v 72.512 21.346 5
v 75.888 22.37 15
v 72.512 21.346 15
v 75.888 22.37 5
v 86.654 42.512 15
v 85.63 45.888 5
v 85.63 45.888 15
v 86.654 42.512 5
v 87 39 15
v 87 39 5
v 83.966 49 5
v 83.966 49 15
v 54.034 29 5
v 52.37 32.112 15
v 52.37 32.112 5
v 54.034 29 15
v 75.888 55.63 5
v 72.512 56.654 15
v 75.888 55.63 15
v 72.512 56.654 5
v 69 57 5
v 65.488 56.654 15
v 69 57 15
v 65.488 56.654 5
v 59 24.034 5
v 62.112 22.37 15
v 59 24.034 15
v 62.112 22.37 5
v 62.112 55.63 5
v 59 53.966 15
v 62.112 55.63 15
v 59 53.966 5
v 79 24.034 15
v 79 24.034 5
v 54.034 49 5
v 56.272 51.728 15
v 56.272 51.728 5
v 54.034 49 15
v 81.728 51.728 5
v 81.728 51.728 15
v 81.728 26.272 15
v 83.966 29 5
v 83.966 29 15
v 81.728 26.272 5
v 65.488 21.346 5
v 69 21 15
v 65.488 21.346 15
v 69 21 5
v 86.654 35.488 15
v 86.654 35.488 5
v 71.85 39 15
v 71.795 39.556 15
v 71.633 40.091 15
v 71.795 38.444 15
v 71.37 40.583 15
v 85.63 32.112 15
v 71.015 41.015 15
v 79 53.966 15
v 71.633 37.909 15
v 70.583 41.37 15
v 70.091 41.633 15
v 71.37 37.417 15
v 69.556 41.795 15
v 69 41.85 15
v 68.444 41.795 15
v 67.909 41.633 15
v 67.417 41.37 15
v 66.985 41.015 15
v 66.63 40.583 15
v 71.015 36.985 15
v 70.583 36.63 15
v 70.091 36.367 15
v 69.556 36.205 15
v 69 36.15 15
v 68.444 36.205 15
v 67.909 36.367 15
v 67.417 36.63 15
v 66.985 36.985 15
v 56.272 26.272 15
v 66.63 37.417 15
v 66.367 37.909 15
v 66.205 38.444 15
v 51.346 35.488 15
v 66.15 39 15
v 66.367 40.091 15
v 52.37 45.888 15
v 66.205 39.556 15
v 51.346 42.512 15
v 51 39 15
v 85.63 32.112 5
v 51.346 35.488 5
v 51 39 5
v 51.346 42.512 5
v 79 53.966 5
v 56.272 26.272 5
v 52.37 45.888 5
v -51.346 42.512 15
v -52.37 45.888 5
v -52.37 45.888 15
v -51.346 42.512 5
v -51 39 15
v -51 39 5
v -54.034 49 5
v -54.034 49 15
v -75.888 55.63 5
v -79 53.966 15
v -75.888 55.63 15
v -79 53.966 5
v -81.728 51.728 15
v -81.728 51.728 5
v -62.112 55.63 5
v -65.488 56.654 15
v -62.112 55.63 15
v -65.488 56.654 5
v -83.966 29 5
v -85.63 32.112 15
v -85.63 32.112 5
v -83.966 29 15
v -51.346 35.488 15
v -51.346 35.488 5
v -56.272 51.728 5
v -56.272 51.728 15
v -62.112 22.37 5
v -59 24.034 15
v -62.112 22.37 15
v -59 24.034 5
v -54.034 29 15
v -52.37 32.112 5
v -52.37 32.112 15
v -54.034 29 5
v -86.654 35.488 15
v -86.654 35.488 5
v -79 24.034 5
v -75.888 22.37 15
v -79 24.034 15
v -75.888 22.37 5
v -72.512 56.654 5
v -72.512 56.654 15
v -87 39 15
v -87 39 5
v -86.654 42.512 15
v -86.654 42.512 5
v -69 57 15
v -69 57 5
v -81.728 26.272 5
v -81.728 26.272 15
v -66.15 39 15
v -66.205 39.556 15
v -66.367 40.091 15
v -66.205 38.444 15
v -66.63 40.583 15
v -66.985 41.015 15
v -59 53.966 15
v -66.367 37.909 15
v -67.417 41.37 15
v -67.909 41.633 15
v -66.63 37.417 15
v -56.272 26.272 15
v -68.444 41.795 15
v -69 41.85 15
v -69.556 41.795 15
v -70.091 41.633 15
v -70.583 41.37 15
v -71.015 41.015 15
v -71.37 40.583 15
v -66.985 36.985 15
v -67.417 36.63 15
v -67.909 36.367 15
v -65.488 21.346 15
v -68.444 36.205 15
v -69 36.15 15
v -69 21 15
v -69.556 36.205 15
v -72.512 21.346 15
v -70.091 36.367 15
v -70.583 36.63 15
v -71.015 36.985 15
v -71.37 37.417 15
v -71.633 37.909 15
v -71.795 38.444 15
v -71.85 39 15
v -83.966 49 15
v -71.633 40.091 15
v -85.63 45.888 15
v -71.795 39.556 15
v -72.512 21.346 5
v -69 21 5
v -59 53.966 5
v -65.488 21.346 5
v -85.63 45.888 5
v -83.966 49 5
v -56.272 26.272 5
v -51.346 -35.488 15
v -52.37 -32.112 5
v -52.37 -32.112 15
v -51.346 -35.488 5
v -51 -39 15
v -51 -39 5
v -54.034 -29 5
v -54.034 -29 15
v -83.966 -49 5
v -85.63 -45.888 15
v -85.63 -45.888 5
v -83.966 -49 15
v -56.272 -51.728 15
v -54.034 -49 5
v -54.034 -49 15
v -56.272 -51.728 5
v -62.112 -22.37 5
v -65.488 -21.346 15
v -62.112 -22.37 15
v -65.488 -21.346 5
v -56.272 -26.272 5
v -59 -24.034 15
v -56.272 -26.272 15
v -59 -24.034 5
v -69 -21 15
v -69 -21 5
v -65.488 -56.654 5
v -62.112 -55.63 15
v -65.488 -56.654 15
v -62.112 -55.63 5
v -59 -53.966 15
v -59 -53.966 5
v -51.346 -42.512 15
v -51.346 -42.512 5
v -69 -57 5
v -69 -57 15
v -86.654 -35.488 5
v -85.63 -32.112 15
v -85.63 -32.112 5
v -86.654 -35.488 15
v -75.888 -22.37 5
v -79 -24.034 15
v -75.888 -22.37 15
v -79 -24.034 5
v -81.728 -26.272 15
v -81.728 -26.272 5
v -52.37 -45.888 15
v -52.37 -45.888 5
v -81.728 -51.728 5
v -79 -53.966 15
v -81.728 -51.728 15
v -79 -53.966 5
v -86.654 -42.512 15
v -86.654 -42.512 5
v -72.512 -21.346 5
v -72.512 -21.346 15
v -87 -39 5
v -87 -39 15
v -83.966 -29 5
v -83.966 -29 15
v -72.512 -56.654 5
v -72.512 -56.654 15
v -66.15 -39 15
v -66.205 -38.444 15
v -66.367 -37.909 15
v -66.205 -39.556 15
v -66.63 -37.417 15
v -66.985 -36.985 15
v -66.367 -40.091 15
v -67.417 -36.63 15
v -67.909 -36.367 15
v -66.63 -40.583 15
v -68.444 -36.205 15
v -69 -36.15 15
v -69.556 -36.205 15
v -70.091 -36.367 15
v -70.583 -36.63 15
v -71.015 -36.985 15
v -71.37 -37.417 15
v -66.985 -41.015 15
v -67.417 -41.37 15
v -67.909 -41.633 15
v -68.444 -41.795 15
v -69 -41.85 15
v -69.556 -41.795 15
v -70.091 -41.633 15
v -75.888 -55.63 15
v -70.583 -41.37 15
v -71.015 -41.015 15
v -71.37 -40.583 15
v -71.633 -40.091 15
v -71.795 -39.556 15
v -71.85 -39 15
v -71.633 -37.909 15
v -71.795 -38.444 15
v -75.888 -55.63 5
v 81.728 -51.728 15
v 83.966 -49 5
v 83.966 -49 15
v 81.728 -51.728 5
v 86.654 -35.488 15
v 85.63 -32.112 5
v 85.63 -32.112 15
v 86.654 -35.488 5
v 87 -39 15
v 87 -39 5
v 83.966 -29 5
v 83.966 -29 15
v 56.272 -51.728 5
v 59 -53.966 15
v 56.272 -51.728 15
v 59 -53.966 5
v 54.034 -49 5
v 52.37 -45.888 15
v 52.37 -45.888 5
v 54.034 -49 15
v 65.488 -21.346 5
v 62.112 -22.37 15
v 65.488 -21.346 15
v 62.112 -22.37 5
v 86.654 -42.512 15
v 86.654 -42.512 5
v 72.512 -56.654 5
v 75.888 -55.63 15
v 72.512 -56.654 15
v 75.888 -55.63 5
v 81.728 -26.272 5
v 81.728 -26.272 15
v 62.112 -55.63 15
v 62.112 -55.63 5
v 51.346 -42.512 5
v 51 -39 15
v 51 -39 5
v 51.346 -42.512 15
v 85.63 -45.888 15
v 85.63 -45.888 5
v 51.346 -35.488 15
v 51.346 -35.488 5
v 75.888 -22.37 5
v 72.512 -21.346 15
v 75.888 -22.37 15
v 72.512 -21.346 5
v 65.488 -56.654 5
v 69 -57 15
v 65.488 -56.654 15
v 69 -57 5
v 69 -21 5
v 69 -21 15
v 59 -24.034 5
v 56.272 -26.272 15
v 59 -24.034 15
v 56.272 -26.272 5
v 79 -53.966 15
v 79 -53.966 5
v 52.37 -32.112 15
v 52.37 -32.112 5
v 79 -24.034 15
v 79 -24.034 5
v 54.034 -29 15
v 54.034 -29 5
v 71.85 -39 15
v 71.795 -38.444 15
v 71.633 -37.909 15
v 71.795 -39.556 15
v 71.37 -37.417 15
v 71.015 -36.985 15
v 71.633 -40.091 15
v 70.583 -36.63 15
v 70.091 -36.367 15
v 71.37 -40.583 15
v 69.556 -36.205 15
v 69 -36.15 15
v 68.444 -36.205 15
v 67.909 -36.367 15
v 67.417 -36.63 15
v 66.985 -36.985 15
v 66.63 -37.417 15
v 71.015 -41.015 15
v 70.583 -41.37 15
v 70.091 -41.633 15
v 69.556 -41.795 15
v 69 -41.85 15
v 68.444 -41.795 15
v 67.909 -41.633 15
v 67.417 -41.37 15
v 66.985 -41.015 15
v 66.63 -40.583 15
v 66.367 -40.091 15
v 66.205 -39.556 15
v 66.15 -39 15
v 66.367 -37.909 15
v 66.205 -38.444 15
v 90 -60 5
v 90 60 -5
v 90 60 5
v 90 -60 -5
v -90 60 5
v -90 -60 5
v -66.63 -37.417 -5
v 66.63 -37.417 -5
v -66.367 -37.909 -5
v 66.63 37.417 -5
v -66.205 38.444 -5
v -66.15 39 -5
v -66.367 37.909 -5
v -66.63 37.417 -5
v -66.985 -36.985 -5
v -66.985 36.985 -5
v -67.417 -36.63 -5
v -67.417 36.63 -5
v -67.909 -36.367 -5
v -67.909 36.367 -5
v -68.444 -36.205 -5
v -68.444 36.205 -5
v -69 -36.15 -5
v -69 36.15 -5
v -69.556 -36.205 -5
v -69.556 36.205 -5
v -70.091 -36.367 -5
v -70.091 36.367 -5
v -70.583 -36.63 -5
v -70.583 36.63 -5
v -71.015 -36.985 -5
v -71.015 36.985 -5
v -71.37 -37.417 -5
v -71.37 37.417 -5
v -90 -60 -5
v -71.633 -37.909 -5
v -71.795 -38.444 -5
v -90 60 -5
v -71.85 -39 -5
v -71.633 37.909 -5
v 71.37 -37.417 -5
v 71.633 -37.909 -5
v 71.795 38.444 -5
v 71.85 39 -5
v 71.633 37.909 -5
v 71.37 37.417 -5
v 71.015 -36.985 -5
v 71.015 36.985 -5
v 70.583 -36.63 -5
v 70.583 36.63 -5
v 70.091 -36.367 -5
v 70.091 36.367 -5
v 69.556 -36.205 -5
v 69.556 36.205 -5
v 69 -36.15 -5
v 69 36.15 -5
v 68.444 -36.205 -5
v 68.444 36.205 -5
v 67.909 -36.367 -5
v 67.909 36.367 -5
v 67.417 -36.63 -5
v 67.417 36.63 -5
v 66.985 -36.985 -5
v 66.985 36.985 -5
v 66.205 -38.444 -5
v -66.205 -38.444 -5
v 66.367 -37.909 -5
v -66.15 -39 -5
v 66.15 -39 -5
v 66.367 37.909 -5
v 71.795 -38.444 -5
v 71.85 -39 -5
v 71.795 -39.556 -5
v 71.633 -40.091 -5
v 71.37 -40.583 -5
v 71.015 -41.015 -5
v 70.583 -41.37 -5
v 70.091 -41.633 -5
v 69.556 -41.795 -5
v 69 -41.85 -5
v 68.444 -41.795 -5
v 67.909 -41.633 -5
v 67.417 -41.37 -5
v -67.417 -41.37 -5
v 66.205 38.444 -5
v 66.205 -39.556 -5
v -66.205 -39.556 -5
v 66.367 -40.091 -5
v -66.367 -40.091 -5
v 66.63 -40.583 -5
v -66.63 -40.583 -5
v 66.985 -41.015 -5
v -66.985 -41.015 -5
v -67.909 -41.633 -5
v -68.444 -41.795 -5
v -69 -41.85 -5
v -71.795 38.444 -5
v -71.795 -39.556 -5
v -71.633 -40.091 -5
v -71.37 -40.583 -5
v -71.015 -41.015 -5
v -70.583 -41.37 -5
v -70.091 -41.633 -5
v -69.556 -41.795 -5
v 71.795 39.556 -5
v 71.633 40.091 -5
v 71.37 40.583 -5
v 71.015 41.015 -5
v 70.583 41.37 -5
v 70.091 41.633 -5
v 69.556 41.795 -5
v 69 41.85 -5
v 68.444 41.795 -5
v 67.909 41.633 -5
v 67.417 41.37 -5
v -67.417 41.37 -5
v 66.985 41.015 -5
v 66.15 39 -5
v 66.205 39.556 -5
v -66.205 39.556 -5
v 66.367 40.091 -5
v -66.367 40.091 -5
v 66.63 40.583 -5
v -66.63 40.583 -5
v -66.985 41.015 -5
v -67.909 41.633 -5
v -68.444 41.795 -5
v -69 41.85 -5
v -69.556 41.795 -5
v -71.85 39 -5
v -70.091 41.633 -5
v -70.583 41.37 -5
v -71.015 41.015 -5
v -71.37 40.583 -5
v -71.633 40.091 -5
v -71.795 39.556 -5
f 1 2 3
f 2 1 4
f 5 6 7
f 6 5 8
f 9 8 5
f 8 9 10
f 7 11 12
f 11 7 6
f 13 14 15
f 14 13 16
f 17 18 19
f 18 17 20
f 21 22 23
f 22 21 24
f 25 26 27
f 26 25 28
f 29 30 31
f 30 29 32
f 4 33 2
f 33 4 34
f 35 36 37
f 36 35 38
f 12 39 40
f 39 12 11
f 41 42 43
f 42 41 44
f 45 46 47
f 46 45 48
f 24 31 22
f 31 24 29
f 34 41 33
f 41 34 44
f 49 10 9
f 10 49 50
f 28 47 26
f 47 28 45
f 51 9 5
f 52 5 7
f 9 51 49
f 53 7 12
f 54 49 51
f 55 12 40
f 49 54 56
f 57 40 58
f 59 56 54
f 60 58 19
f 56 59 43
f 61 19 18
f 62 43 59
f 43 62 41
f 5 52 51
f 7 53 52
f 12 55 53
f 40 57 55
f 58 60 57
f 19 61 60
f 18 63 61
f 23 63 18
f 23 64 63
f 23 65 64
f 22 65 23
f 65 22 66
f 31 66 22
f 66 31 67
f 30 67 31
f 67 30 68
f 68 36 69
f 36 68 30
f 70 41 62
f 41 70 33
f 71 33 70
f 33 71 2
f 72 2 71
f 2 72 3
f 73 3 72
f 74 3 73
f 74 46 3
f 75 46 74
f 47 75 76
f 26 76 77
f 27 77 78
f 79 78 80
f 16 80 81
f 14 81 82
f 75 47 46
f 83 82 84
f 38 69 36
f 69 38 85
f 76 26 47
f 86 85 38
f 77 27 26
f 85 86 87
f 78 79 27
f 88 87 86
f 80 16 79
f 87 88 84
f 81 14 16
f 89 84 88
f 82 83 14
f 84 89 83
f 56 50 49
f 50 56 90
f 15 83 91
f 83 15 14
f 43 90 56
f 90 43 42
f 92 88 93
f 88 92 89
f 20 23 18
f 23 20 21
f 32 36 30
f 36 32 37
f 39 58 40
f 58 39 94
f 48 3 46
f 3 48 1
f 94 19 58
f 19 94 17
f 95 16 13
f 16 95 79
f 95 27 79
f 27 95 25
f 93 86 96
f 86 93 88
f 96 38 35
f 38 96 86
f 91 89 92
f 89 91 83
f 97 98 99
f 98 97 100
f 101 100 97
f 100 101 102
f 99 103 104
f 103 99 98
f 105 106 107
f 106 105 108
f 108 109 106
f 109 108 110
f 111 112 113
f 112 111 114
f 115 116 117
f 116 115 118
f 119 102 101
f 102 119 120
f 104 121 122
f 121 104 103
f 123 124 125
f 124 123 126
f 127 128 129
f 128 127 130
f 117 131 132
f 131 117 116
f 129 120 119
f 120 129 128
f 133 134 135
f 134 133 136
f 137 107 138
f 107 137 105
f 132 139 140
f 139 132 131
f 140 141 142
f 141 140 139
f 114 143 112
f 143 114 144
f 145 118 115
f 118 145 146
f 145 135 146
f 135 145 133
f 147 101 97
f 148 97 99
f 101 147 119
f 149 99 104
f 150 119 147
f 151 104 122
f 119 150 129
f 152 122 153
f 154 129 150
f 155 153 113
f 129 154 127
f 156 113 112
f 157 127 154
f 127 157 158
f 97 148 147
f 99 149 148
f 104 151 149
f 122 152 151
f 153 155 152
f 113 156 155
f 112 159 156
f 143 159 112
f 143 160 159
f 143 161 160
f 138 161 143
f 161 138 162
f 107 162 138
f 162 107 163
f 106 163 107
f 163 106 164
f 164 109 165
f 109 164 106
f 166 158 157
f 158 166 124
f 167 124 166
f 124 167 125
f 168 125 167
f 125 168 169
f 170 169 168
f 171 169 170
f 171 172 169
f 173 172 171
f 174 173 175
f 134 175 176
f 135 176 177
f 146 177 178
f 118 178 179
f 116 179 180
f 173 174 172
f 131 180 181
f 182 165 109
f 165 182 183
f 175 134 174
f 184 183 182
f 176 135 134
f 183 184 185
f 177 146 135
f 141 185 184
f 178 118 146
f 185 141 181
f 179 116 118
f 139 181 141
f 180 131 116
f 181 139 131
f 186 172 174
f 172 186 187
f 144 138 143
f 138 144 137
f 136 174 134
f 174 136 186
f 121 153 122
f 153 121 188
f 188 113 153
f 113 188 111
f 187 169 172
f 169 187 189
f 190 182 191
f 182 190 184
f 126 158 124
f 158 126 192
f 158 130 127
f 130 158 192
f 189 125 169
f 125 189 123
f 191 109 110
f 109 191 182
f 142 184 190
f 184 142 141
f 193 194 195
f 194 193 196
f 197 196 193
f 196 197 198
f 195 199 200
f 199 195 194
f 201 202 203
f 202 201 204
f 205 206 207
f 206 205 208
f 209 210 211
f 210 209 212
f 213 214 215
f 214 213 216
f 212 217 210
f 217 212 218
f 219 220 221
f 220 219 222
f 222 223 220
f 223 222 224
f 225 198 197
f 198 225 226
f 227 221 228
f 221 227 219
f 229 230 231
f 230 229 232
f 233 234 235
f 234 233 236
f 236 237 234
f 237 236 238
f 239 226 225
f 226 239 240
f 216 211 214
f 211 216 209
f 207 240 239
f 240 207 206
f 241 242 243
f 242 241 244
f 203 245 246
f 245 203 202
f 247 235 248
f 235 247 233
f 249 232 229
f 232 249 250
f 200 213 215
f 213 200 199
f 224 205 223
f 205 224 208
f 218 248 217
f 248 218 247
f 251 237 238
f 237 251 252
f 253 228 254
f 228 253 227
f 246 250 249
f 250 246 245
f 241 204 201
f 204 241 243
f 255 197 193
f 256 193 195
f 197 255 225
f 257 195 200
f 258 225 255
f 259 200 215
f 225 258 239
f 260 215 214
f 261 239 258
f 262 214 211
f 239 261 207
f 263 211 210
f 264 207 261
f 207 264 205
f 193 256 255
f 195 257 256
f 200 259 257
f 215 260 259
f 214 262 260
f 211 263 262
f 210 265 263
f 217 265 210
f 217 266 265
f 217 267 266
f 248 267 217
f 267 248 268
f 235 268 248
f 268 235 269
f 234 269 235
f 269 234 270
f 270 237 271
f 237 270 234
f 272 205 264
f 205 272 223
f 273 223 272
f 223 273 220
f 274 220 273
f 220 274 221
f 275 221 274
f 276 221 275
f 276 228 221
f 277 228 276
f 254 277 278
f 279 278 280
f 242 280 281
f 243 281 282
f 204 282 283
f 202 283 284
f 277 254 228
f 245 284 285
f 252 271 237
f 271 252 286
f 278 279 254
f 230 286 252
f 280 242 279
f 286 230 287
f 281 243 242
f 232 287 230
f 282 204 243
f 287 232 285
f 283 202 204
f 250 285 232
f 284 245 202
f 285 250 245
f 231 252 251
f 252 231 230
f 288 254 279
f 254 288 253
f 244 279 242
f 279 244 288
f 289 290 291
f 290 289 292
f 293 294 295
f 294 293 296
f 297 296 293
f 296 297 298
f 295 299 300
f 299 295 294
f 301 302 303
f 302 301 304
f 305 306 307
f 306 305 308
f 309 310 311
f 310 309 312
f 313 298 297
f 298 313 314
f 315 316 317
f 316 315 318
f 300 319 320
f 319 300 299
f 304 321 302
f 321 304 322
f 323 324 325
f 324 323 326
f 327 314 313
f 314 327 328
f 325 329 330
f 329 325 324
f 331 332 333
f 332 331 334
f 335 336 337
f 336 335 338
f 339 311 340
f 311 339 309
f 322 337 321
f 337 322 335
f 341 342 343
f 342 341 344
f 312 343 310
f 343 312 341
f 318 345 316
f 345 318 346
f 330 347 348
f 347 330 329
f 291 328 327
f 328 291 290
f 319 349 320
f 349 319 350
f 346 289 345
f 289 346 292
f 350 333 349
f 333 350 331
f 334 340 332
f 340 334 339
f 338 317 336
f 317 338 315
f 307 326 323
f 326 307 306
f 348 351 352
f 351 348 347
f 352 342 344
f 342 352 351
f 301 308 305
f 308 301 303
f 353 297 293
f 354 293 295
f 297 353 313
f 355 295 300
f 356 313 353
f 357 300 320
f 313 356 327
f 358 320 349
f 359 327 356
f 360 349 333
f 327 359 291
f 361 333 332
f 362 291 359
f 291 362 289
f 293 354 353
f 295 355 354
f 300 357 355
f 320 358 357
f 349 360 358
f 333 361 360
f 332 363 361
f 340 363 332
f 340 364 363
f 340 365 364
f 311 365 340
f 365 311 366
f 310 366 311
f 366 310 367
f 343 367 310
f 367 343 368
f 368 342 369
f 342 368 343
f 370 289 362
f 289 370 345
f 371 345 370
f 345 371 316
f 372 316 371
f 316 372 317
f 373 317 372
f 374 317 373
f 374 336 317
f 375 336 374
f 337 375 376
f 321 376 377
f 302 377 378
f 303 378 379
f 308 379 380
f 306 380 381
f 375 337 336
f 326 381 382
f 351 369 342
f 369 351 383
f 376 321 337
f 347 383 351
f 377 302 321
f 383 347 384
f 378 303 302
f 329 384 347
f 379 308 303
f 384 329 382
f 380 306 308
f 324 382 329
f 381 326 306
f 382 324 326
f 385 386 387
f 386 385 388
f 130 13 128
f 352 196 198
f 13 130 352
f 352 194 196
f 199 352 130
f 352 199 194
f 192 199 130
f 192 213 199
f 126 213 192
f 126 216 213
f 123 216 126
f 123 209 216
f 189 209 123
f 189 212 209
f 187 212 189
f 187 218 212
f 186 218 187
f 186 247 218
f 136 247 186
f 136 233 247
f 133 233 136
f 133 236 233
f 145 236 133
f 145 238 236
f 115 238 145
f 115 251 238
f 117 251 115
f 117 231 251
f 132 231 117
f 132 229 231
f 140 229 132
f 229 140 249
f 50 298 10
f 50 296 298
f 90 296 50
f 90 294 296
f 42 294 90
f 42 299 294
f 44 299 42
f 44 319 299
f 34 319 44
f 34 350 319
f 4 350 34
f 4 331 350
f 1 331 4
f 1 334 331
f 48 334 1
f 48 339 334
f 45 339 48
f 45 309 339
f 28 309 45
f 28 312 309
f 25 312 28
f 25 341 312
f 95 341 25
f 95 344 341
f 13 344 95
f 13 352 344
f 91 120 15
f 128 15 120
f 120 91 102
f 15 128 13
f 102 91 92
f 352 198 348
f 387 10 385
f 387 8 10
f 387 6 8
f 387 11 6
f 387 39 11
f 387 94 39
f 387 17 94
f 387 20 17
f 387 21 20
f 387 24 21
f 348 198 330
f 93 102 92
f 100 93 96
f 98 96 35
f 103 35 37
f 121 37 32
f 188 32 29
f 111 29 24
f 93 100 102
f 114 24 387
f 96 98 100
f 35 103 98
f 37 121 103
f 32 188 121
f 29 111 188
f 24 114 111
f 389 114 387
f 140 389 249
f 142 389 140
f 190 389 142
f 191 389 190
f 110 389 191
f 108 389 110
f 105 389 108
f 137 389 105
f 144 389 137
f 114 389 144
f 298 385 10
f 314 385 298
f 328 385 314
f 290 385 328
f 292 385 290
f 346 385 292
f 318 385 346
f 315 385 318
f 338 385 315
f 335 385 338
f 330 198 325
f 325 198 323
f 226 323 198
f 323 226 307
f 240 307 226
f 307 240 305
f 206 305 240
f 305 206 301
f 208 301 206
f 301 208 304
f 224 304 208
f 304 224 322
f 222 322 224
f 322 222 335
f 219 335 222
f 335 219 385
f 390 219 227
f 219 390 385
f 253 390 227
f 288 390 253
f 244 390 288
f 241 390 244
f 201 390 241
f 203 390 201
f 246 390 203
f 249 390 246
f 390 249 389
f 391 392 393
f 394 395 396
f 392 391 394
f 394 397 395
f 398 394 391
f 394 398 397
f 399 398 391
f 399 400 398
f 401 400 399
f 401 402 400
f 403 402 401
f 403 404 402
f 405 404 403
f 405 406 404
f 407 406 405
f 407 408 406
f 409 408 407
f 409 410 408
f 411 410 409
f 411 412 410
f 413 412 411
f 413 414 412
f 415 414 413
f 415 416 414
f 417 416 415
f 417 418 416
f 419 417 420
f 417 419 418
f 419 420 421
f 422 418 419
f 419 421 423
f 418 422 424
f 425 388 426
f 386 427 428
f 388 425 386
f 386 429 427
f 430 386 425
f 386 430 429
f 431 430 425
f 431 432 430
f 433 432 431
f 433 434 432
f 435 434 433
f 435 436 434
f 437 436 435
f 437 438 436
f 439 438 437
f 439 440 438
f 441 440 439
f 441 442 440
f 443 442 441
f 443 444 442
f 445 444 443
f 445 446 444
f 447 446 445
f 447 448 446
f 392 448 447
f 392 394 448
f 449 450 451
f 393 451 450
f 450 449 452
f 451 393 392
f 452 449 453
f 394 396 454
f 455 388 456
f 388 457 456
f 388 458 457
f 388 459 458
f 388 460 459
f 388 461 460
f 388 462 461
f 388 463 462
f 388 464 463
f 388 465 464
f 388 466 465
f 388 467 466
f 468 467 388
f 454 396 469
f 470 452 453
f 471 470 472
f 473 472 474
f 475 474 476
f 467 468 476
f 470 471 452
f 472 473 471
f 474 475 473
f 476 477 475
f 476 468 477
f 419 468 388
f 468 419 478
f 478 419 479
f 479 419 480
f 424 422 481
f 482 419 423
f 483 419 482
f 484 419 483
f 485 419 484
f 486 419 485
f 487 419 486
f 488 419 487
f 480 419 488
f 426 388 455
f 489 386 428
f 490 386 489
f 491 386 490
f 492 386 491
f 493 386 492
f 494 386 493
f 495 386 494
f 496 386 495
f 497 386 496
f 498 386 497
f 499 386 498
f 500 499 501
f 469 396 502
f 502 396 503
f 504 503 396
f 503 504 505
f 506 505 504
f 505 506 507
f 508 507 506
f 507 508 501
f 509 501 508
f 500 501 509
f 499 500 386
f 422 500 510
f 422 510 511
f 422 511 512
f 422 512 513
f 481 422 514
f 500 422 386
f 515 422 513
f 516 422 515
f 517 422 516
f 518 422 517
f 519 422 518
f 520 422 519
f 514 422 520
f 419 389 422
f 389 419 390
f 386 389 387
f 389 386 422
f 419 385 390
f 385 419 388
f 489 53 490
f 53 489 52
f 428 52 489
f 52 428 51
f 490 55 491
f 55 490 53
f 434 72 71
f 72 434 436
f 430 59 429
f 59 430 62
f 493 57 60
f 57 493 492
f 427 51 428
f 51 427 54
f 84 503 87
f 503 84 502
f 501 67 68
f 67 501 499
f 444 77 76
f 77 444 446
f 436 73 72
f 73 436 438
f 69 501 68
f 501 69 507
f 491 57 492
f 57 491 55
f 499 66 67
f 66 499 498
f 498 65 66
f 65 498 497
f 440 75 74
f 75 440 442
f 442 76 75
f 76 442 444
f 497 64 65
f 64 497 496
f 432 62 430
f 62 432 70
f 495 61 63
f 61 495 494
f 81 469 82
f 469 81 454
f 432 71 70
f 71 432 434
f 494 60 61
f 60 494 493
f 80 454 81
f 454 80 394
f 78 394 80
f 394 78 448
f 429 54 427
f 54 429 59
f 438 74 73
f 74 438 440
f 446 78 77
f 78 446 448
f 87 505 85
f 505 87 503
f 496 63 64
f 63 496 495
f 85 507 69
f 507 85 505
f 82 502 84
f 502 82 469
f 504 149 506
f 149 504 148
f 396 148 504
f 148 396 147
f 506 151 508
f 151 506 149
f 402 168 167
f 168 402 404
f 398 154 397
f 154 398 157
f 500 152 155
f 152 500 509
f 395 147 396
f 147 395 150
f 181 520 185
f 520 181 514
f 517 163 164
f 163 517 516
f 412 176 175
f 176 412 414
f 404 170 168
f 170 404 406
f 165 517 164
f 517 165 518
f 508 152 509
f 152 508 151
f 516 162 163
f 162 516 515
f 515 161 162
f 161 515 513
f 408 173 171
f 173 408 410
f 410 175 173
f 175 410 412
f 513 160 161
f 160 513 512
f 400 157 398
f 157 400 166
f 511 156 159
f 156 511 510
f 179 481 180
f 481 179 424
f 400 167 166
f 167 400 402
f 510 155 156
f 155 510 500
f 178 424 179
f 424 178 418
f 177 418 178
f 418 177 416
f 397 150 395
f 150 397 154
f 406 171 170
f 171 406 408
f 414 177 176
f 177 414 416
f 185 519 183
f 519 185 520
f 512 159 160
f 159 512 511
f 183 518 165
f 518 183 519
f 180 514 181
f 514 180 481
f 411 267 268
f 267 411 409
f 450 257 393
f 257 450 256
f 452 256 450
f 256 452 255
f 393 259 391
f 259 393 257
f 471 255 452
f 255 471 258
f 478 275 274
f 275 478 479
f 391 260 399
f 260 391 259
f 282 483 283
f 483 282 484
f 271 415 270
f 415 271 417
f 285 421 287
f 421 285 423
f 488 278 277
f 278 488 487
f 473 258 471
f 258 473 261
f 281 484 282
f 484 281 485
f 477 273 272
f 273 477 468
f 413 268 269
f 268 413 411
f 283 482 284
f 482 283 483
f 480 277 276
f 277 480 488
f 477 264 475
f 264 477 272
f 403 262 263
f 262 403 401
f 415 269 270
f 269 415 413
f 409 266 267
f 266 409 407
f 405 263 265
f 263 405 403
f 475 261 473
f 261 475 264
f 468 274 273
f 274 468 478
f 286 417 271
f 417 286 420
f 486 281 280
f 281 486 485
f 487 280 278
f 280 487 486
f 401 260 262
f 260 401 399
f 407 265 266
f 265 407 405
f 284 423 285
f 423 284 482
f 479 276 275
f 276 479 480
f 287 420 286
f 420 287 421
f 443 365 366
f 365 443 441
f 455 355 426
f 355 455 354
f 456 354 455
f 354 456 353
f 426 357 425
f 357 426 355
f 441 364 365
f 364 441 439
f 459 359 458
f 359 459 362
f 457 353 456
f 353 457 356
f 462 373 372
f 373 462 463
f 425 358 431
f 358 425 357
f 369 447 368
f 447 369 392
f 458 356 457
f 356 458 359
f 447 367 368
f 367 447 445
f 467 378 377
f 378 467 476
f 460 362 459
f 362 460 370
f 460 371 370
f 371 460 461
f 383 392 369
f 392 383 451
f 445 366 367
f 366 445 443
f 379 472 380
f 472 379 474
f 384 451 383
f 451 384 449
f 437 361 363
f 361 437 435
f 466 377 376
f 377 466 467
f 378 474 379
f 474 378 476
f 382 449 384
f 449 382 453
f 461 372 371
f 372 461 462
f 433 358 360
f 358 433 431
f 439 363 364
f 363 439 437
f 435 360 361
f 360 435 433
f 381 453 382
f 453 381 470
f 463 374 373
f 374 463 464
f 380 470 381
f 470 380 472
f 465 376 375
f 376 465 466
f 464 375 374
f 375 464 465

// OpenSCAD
$fn = 32;

// ----------------------------------------------------------------------
// Anchor pads 180 x 120 x 20
// four corner bosses with anchor holes
// ----------------------------------------------------------------------

// --- parameters (mm) ---
plate = [180, 120, 10];  // base plate size (x, y, z)
seat_tol = 0.05;         // tolerance at the seating features
free_tol = 0.3;          // general tolerance on the free sizes
pads = 4;                // boss count, one per corner
edge = 21;               // boss centre offset from the plate edge
boss_d = 36;             // boss diameter
boss_h = 10;             // boss height above the base plate
bore_d = 5.5;            // nominal hole diameter from the drawing
print_allowance = 0.2;   // clearance added for printing

// --- derived feature positions (mm) ---
hole_d = bore_d + print_allowance;  // = 5.7   hole diameter as printed
height = plate[2] + boss_h;         // = 20   overall height of the part
corner_x = plate[0] / 2 - edge;     // = 69   boss centre X
corner_y = plate[1] / 2 - edge;     // = 39   boss centre Y
feature_centers = [
  [corner_x, corner_y],
  [-corner_x, corner_y],
  [-corner_x, -corner_y],
  [corner_x, -corner_y]
];   // boss centres, anchor holes are drilled there

// base plate, four bosses standing on it, anchor holes all the way through
difference() {
  union() {
    cube(plate, center = true);
    for (centre = feature_centers)
      translate([centre[0], centre[1], plate[2] / 2 - 1])
        cylinder(d = boss_d, h = boss_h + 1);
  }
  for (centre = feature_centers)
    translate([centre[0], centre[1], -height])
      cylinder(d = hole_d, h = 2 * height + 2);  // through boss and plate
}
